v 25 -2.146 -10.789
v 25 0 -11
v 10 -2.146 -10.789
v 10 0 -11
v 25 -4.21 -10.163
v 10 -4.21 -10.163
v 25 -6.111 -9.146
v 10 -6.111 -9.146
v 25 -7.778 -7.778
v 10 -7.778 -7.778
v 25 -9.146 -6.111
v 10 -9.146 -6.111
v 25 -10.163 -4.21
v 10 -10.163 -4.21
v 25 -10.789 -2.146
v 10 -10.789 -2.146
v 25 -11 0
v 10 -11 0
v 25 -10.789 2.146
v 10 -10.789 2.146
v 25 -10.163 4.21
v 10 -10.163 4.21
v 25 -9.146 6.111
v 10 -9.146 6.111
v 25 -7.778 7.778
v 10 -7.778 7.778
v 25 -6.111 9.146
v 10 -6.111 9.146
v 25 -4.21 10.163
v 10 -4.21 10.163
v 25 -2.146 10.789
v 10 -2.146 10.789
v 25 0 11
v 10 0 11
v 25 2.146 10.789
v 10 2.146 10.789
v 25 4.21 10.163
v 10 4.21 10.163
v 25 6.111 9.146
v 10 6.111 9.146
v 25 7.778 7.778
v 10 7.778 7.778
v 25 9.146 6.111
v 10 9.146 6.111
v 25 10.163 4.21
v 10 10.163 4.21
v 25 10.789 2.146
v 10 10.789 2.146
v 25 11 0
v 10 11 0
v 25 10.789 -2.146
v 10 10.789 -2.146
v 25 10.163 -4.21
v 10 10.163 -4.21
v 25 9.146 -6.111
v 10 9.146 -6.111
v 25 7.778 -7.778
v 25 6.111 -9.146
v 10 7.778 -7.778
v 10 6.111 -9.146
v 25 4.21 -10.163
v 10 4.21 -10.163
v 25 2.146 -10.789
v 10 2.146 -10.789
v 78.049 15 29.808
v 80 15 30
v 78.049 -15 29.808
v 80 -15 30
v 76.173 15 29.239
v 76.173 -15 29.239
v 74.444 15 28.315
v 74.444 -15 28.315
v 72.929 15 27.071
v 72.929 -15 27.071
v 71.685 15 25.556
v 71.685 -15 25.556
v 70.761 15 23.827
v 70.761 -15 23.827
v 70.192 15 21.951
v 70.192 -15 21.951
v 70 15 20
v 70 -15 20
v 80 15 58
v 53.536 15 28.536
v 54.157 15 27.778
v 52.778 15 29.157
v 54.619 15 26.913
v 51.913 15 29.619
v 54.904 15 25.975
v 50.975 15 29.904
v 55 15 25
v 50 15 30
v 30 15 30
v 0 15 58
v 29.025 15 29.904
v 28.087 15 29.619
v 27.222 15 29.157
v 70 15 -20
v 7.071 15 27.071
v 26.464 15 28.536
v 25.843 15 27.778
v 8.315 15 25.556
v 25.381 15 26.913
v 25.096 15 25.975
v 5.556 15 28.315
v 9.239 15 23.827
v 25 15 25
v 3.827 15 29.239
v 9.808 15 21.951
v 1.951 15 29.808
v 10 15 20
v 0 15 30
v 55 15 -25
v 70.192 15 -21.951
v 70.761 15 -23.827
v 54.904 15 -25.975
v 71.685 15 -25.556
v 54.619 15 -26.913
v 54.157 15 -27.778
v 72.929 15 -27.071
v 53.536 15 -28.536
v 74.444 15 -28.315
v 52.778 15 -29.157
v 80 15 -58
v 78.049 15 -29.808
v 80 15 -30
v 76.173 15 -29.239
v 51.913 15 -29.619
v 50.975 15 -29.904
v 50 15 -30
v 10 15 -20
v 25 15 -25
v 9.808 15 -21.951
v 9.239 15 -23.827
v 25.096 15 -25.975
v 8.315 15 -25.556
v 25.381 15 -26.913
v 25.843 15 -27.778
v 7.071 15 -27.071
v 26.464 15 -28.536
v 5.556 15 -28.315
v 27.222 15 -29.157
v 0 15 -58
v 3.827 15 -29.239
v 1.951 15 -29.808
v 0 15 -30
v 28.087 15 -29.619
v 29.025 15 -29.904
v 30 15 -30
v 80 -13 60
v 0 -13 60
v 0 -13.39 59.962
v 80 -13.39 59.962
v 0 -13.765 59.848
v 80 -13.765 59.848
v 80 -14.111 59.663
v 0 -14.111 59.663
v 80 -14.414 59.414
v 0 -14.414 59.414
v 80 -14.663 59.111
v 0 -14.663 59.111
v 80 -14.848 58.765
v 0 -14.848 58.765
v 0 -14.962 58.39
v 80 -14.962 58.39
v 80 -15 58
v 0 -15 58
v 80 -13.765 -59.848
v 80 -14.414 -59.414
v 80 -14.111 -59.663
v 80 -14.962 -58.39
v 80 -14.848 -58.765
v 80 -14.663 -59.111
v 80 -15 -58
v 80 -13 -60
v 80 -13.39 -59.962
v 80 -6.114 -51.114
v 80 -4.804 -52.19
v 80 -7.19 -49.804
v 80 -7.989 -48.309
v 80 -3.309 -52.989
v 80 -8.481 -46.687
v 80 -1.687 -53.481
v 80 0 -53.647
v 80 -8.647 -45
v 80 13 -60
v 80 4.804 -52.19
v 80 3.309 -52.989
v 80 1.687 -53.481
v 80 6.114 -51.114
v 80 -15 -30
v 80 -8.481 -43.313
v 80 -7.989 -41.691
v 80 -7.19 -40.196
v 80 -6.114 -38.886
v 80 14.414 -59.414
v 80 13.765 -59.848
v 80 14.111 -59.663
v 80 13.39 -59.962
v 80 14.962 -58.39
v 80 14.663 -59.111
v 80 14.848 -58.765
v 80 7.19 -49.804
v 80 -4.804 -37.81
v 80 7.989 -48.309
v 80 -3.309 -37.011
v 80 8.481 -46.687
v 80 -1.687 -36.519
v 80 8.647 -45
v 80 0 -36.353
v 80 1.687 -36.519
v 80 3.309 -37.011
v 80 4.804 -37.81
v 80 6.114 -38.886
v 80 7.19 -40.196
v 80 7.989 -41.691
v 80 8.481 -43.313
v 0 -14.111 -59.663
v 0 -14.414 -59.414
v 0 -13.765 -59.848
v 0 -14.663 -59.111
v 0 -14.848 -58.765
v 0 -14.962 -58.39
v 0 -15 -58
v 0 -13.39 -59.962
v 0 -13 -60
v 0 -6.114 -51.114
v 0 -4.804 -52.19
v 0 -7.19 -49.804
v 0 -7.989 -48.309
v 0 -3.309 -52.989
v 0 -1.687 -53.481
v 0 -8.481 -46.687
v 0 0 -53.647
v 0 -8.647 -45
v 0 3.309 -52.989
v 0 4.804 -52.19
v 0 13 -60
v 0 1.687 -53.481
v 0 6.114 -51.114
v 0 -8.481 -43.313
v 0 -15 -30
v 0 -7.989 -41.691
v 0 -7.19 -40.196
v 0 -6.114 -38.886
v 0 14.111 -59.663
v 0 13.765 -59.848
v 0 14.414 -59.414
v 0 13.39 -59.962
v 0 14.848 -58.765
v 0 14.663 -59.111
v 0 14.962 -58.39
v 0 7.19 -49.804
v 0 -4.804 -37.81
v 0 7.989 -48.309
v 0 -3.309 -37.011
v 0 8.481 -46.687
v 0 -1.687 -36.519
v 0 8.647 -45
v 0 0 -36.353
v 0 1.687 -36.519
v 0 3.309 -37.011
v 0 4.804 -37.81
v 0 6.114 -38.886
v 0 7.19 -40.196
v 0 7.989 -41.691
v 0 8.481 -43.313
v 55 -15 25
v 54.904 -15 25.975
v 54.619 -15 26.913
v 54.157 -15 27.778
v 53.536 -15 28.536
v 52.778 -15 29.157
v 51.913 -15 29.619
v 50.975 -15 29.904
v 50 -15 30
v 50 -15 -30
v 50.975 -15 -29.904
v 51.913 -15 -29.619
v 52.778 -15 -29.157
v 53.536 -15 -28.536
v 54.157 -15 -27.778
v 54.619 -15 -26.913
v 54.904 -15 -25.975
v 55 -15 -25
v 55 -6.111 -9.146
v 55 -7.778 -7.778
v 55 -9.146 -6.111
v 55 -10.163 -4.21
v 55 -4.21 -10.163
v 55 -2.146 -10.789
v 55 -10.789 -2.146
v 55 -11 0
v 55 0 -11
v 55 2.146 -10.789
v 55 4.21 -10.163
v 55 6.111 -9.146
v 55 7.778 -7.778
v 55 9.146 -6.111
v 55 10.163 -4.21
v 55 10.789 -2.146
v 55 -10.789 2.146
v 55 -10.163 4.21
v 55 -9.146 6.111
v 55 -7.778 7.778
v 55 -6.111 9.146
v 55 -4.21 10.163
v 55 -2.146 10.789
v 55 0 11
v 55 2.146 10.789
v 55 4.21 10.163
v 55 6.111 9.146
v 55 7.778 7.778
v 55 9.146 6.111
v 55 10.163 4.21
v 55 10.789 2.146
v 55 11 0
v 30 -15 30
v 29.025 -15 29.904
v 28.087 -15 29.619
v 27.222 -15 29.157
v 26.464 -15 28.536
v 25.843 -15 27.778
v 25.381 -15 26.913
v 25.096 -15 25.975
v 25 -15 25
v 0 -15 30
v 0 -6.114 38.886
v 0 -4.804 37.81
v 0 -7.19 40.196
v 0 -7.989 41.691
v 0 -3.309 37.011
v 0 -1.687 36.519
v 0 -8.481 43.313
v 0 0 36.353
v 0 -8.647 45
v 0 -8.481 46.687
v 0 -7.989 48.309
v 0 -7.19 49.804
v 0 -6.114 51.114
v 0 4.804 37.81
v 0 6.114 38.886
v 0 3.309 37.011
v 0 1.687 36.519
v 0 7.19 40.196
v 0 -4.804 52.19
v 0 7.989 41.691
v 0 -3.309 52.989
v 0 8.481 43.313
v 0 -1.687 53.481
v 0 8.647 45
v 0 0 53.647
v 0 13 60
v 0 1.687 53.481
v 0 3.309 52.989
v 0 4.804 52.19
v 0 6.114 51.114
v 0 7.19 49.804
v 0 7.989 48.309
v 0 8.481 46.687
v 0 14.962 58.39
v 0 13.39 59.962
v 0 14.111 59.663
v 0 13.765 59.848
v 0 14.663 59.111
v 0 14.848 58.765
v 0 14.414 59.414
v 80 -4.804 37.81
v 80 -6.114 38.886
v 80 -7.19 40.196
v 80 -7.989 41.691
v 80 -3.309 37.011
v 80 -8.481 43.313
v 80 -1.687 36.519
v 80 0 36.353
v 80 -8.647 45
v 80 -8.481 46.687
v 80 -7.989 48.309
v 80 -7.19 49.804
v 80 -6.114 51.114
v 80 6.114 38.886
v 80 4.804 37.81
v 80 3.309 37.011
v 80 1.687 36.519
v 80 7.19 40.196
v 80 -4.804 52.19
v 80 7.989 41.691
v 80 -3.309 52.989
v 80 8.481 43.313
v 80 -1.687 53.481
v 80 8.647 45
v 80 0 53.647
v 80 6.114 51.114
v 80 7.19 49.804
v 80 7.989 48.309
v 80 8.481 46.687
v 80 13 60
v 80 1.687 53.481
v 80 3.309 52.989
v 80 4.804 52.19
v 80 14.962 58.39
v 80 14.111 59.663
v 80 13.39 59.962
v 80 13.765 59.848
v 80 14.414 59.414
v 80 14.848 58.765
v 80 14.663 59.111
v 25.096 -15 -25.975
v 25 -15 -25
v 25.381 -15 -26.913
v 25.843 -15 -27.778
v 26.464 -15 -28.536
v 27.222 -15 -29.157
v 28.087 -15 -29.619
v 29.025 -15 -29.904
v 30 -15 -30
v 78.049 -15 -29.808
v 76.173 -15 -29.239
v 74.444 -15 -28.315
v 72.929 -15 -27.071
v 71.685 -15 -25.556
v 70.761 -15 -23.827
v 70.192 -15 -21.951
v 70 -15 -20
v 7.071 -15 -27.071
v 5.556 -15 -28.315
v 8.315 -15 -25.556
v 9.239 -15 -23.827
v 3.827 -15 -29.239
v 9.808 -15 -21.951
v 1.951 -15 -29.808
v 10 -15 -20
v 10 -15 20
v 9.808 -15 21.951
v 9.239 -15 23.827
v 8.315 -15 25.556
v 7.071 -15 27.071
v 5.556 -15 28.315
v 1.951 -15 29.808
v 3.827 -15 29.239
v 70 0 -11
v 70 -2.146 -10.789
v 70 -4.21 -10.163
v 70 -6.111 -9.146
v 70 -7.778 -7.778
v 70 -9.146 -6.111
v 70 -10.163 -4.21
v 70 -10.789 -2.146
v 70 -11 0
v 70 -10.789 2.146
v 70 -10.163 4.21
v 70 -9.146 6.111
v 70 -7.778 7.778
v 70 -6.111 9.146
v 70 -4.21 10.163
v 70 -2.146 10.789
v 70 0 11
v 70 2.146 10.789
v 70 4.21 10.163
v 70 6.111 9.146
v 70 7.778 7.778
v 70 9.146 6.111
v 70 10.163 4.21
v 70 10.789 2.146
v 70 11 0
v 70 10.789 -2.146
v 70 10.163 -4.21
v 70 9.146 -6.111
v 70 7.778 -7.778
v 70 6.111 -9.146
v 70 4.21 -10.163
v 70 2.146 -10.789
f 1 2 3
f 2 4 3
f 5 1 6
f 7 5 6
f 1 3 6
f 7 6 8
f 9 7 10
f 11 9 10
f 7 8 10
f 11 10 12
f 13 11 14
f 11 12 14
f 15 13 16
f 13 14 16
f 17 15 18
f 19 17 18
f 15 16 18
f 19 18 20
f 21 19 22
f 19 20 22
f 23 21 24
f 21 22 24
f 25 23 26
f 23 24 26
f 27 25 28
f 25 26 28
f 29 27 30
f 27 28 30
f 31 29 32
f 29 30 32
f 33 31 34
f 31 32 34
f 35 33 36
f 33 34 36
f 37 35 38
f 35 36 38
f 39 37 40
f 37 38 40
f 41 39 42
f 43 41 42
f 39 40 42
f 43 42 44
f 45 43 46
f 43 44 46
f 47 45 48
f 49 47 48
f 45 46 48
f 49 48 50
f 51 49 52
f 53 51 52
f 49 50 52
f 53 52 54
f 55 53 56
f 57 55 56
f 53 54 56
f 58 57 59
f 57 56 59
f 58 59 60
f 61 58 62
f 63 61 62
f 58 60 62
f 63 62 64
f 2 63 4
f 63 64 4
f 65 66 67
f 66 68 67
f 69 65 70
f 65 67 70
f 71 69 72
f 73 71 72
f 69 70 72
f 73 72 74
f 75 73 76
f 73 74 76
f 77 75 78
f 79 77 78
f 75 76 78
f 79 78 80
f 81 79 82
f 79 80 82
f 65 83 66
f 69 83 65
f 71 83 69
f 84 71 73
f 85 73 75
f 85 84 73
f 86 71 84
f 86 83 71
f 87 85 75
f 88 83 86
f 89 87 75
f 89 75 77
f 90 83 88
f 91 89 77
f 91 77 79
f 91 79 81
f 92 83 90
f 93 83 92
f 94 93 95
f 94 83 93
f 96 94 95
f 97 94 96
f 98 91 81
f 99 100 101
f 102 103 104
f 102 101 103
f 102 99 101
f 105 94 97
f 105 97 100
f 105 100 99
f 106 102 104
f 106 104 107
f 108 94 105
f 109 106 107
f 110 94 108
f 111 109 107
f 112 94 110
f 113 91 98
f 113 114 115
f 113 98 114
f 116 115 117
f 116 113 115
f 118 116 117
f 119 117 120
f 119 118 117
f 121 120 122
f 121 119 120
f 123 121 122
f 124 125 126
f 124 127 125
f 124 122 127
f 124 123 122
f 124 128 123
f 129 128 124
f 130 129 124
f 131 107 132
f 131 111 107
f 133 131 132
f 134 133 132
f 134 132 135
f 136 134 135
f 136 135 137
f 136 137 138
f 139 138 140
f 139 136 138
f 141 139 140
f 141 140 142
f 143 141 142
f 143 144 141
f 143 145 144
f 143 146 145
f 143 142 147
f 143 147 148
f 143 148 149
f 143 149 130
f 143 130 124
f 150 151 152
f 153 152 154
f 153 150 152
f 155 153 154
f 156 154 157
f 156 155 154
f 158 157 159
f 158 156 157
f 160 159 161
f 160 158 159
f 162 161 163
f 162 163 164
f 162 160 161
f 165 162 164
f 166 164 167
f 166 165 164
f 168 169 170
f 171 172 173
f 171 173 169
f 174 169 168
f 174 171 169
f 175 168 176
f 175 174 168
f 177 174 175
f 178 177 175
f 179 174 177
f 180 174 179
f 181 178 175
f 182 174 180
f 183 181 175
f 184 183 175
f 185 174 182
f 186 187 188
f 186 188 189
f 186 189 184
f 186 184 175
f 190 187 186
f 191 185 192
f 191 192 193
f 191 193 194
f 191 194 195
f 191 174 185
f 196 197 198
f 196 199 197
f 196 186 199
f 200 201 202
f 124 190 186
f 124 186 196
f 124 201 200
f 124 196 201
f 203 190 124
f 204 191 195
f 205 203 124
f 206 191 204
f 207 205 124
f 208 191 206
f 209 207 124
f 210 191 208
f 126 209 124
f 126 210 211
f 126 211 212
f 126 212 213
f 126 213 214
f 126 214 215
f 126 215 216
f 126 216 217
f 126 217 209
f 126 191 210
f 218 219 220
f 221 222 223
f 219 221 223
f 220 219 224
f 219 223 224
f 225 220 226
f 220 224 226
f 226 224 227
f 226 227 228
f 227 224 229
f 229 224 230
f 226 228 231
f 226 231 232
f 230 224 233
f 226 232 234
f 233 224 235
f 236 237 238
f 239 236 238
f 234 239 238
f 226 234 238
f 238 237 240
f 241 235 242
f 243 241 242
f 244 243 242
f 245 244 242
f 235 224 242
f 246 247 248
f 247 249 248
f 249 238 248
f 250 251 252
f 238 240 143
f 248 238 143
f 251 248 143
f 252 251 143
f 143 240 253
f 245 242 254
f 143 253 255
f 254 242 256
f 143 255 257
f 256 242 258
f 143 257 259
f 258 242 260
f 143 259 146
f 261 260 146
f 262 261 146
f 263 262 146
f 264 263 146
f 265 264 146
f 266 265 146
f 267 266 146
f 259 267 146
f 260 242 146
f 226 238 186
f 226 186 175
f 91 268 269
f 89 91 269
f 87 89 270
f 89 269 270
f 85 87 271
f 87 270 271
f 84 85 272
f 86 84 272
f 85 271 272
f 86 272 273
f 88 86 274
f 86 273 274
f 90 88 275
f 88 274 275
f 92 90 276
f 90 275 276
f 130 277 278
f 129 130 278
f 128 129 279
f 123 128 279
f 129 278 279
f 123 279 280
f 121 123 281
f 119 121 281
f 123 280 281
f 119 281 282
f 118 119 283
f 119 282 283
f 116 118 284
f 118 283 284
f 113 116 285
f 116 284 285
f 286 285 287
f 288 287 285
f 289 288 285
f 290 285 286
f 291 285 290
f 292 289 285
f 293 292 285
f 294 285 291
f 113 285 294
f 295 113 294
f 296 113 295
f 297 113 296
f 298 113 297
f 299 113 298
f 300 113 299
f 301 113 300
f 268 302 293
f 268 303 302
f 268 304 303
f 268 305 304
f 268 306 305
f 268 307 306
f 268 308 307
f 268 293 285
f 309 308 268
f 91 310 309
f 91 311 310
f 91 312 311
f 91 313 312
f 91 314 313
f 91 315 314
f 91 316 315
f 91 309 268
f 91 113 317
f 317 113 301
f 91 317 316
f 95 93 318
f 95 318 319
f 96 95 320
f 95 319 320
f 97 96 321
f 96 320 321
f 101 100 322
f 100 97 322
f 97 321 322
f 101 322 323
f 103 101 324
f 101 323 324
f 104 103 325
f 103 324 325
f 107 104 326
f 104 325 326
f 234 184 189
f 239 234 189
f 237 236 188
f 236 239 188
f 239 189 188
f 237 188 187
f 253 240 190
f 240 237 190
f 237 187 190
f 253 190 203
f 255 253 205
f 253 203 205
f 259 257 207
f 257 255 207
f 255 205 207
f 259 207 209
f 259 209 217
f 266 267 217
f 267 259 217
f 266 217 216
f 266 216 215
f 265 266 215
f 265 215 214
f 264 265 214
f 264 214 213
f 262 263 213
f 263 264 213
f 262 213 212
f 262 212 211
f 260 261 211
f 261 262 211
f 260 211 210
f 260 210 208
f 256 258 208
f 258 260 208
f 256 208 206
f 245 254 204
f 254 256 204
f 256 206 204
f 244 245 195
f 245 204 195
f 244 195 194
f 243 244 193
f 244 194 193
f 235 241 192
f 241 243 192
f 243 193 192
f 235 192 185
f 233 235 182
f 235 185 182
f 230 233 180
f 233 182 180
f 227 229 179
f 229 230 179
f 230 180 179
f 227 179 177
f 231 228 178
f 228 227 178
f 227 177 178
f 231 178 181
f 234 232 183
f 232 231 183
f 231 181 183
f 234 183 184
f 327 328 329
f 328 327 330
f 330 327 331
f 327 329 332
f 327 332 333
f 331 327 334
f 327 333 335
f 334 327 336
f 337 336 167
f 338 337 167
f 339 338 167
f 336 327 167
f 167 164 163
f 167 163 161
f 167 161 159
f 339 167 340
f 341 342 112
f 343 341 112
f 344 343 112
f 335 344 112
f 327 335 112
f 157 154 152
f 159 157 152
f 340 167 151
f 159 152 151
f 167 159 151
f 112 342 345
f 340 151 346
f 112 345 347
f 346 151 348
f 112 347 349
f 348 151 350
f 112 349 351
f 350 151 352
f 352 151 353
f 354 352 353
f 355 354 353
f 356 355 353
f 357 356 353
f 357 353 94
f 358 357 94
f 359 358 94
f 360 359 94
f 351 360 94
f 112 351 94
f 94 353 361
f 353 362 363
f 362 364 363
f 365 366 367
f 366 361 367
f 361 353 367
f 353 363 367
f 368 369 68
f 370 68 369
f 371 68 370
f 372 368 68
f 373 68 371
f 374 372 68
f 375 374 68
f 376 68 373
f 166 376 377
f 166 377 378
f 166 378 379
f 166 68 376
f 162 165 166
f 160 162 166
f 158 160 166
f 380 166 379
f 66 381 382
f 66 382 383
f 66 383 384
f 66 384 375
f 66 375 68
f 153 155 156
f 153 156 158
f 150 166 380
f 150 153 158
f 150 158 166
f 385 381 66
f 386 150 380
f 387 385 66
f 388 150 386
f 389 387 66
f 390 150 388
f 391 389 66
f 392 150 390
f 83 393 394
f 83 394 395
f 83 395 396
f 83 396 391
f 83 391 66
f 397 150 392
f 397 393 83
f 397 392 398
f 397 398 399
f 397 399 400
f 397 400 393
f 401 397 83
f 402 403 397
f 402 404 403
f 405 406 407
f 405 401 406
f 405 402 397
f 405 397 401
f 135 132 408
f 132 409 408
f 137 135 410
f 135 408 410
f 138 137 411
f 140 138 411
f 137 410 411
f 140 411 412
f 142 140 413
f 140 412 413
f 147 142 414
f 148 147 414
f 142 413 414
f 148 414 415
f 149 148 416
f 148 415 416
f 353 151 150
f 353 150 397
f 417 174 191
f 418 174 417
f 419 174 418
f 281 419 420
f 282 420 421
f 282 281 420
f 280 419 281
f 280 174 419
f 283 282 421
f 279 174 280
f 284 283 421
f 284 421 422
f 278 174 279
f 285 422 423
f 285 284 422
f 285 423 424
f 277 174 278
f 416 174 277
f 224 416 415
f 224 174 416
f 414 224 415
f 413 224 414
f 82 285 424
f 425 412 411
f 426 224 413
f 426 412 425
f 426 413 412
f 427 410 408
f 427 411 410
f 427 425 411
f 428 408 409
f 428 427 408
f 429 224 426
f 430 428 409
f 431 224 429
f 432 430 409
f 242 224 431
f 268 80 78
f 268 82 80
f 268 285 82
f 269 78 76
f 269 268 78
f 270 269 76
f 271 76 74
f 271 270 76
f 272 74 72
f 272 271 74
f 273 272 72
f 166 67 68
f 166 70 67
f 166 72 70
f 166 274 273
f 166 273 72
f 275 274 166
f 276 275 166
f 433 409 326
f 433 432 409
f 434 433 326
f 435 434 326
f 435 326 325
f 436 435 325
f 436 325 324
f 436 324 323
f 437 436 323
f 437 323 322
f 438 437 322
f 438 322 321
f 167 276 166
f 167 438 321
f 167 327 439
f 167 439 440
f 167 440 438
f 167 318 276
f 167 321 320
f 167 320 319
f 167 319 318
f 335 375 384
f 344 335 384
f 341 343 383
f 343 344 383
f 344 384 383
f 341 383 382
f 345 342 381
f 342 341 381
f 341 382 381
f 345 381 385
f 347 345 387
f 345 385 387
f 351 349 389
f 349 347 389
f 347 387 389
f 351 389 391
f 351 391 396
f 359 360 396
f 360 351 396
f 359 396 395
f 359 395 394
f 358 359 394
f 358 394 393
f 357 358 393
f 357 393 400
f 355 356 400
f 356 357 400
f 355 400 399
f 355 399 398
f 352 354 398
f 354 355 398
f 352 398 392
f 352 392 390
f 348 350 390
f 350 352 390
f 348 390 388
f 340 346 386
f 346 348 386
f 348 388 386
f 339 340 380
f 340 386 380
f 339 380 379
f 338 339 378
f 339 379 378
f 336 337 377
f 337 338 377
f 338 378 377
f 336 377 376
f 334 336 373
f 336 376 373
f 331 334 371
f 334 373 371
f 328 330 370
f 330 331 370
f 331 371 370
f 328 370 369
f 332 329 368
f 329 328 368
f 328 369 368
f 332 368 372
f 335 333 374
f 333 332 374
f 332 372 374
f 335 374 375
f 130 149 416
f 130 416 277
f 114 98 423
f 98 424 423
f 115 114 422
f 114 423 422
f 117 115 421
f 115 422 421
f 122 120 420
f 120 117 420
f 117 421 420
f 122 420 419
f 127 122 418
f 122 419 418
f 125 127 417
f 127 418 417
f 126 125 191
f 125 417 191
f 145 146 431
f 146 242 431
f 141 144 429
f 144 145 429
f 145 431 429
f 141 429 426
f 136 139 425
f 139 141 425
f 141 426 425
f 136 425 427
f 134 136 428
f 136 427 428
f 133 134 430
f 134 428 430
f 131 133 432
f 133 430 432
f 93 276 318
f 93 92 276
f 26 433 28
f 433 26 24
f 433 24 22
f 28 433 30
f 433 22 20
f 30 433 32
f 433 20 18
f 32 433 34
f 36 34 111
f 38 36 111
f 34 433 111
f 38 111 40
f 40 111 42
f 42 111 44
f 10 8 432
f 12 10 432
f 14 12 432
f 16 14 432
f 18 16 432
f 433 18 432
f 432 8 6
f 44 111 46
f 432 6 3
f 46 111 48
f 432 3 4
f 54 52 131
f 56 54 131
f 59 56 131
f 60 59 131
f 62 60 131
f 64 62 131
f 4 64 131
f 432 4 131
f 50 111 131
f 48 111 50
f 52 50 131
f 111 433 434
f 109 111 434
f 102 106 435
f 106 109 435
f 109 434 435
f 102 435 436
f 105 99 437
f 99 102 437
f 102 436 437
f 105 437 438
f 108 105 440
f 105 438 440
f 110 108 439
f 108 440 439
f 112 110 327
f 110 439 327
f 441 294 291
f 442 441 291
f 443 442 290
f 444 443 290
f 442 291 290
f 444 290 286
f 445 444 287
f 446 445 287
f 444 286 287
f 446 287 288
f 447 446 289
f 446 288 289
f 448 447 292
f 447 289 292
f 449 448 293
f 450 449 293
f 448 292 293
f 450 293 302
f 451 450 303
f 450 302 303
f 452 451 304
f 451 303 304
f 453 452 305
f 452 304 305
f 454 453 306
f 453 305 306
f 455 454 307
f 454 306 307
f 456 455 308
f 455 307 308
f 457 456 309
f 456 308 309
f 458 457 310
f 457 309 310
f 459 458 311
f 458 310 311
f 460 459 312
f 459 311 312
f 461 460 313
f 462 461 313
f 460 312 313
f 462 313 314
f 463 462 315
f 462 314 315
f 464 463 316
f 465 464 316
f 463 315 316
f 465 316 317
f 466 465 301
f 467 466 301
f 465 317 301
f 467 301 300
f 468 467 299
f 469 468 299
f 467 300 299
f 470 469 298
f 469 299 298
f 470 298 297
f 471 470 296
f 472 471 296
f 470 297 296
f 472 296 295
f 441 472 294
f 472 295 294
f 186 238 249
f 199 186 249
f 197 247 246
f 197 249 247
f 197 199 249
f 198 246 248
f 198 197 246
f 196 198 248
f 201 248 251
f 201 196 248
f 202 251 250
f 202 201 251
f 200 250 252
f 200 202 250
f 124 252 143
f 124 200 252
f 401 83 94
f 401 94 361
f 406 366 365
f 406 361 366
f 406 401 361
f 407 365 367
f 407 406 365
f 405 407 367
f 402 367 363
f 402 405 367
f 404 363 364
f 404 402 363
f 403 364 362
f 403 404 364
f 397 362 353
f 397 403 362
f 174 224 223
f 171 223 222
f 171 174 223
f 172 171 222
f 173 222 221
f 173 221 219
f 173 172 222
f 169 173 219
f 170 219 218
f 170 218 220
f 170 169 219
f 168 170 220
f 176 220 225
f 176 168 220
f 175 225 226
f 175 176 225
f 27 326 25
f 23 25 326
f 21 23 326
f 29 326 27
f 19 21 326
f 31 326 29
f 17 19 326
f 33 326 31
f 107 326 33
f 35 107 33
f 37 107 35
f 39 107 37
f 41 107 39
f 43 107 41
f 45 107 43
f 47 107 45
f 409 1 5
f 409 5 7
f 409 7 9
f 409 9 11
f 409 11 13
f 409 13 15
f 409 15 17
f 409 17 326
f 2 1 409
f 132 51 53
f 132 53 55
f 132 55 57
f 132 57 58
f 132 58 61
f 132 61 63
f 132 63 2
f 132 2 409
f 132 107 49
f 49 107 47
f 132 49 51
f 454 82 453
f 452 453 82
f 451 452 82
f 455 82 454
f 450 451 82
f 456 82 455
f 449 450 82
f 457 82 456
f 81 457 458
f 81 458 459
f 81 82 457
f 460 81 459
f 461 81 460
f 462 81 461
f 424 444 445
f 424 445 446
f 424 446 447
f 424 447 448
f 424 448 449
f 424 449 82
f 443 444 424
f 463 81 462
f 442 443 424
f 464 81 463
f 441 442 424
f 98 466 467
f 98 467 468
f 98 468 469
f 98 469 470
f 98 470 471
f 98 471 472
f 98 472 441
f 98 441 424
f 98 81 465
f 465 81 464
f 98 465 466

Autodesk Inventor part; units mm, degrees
ref_plane "YZ Plane" through (0, 0, 0) normal (1, 0, 0) x (0, 1, 0)
ref_plane "XZ Plane" through (0, 0, 0) normal (0, 1, 0) x (-1, 0, 0)
sketch "Sketch1" plane through (0, 0, 0) normal (1, 0, 0) x (0, 1, 0)
  line L0 (-15, 60) -> (15, 60)
  line L1 (15, 60) -> (15, -60)
  line L2 (15, -60) -> (-15, -60)
  line L3 (-15, -60) -> (-15, 60)
  line L4 (-15, 60) -> (15, -60) construction
  line L5 (15, 60) -> (-15, -60) construction
  point P0 (0, 0)
  dimension "d0" = 30
  dimension "d1" = 120
extrude "Extrusion1" add sketch "Sketch1" along normal blind 80
sketch "Sketch2" plane through (80, 0, 0) normal (1, 0, 0) x (0, 0, -1)
  line L0 (-60, 15) -> (-60, -15) projected
  line L1 (-60, 0) -> (60, 0)
  line L2 (60, -15) -> (60, 15) projected
  line L3 (60, 15) -> (-60, 15) projected
  line L4 (0, 15) -> (0, -15)
  line L5 (-60, -15) -> (60, -15) projected
  point P0 (0, 0)
  point P1 (-45, 0)
  point P2 (45, 0)
  dimension "d4" = 45
hole "Hole1" at (80, 0, 45) at (80, 0, -45) direction (-1, 0, 0) diameter 17.294 depth 41.2 tip angle 118 thread size "M20x2.5" class "6H" standard "ISO Metric profile"
ref_plane "Work Plane1" through (40, 0, 0) normal (1, 0, 0) x (0, 0, -1)
mirror "Mirror1" about plane through (40, 0, 0) normal (1, 0, 0) of "Hole1"
sketch "Sketch5" plane through (0, 15, 60) normal (0, 1, 0) x (1, 0, 0)
  line L0 (0, 0) -> (80, 0) projected
  line L1 (40, 0) -> (40, 120)
  line L2 (0, 120) -> (80, 120) projected
  line L3 (55, 30) -> (25, 30)
  line L4 (25, 30) -> (25, 90)
  line L5 (25, 90) -> (55, 90)
  line L6 (55, 90) -> (55, 30)
  line L7 (55, 30) -> (25, 90) construction
  line L8 (25, 30) -> (55, 90) construction
  line L9 (0, 0) -> (0, 120) projected
  line L10 (0, 30) -> (10, 30)
  line L11 (10, 30) -> (10, 90)
  line L12 (10, 90) -> (0, 90)
  line L13 (0, 90) -> (0, 30)
  line L14 (80, 0) -> (80, 120) projected
  line L15 (80, 30) -> (70, 30)
  line L16 (70, 30) -> (70, 90)
  line L17 (70, 90) -> (80, 90)
  line L18 (80, 90) -> (80, 30)
  point P0 (0, 60)
  point P1 (40, 60)
  dimension "d20" = 30
  dimension "d22" = 30
  dimension "d23" = 30
  dimension "d24" = 60
  dimension "d25" = 10
  dimension "d26" = 10
extrude "Extrusion2" cut sketch "Sketch5" against normal through all contours L9 L12 L11 L10 | L3 L4 L5 L1 | L1 L5 L6 L3 | L15 L16 L17 L14
hole "Hole5" at (70, 0, 0) direction (-1, 0, 0) diameter 22 end through all
fillet "Fillet1" radius 2 4 edges at (40, 15, 60) (40, -15, 60) (40, -15, -60) (40, 15, -60)
fillet "Fillet4" radius 10 2 edges at (70, 0, 30) (10, 0, 30)
fillet "Fillet5" radius 5 2 edges at (25, 0, 30) (55, 0, 30)
fillet "Fillet6" radius 10 2 edges at (70, 0, -30) (10, 0, -30)
fillet "Fillet9" radius 5 2 edges at (25, 0, -30) (55, 0, -30)
properties part number "Profile_Middle_04"
